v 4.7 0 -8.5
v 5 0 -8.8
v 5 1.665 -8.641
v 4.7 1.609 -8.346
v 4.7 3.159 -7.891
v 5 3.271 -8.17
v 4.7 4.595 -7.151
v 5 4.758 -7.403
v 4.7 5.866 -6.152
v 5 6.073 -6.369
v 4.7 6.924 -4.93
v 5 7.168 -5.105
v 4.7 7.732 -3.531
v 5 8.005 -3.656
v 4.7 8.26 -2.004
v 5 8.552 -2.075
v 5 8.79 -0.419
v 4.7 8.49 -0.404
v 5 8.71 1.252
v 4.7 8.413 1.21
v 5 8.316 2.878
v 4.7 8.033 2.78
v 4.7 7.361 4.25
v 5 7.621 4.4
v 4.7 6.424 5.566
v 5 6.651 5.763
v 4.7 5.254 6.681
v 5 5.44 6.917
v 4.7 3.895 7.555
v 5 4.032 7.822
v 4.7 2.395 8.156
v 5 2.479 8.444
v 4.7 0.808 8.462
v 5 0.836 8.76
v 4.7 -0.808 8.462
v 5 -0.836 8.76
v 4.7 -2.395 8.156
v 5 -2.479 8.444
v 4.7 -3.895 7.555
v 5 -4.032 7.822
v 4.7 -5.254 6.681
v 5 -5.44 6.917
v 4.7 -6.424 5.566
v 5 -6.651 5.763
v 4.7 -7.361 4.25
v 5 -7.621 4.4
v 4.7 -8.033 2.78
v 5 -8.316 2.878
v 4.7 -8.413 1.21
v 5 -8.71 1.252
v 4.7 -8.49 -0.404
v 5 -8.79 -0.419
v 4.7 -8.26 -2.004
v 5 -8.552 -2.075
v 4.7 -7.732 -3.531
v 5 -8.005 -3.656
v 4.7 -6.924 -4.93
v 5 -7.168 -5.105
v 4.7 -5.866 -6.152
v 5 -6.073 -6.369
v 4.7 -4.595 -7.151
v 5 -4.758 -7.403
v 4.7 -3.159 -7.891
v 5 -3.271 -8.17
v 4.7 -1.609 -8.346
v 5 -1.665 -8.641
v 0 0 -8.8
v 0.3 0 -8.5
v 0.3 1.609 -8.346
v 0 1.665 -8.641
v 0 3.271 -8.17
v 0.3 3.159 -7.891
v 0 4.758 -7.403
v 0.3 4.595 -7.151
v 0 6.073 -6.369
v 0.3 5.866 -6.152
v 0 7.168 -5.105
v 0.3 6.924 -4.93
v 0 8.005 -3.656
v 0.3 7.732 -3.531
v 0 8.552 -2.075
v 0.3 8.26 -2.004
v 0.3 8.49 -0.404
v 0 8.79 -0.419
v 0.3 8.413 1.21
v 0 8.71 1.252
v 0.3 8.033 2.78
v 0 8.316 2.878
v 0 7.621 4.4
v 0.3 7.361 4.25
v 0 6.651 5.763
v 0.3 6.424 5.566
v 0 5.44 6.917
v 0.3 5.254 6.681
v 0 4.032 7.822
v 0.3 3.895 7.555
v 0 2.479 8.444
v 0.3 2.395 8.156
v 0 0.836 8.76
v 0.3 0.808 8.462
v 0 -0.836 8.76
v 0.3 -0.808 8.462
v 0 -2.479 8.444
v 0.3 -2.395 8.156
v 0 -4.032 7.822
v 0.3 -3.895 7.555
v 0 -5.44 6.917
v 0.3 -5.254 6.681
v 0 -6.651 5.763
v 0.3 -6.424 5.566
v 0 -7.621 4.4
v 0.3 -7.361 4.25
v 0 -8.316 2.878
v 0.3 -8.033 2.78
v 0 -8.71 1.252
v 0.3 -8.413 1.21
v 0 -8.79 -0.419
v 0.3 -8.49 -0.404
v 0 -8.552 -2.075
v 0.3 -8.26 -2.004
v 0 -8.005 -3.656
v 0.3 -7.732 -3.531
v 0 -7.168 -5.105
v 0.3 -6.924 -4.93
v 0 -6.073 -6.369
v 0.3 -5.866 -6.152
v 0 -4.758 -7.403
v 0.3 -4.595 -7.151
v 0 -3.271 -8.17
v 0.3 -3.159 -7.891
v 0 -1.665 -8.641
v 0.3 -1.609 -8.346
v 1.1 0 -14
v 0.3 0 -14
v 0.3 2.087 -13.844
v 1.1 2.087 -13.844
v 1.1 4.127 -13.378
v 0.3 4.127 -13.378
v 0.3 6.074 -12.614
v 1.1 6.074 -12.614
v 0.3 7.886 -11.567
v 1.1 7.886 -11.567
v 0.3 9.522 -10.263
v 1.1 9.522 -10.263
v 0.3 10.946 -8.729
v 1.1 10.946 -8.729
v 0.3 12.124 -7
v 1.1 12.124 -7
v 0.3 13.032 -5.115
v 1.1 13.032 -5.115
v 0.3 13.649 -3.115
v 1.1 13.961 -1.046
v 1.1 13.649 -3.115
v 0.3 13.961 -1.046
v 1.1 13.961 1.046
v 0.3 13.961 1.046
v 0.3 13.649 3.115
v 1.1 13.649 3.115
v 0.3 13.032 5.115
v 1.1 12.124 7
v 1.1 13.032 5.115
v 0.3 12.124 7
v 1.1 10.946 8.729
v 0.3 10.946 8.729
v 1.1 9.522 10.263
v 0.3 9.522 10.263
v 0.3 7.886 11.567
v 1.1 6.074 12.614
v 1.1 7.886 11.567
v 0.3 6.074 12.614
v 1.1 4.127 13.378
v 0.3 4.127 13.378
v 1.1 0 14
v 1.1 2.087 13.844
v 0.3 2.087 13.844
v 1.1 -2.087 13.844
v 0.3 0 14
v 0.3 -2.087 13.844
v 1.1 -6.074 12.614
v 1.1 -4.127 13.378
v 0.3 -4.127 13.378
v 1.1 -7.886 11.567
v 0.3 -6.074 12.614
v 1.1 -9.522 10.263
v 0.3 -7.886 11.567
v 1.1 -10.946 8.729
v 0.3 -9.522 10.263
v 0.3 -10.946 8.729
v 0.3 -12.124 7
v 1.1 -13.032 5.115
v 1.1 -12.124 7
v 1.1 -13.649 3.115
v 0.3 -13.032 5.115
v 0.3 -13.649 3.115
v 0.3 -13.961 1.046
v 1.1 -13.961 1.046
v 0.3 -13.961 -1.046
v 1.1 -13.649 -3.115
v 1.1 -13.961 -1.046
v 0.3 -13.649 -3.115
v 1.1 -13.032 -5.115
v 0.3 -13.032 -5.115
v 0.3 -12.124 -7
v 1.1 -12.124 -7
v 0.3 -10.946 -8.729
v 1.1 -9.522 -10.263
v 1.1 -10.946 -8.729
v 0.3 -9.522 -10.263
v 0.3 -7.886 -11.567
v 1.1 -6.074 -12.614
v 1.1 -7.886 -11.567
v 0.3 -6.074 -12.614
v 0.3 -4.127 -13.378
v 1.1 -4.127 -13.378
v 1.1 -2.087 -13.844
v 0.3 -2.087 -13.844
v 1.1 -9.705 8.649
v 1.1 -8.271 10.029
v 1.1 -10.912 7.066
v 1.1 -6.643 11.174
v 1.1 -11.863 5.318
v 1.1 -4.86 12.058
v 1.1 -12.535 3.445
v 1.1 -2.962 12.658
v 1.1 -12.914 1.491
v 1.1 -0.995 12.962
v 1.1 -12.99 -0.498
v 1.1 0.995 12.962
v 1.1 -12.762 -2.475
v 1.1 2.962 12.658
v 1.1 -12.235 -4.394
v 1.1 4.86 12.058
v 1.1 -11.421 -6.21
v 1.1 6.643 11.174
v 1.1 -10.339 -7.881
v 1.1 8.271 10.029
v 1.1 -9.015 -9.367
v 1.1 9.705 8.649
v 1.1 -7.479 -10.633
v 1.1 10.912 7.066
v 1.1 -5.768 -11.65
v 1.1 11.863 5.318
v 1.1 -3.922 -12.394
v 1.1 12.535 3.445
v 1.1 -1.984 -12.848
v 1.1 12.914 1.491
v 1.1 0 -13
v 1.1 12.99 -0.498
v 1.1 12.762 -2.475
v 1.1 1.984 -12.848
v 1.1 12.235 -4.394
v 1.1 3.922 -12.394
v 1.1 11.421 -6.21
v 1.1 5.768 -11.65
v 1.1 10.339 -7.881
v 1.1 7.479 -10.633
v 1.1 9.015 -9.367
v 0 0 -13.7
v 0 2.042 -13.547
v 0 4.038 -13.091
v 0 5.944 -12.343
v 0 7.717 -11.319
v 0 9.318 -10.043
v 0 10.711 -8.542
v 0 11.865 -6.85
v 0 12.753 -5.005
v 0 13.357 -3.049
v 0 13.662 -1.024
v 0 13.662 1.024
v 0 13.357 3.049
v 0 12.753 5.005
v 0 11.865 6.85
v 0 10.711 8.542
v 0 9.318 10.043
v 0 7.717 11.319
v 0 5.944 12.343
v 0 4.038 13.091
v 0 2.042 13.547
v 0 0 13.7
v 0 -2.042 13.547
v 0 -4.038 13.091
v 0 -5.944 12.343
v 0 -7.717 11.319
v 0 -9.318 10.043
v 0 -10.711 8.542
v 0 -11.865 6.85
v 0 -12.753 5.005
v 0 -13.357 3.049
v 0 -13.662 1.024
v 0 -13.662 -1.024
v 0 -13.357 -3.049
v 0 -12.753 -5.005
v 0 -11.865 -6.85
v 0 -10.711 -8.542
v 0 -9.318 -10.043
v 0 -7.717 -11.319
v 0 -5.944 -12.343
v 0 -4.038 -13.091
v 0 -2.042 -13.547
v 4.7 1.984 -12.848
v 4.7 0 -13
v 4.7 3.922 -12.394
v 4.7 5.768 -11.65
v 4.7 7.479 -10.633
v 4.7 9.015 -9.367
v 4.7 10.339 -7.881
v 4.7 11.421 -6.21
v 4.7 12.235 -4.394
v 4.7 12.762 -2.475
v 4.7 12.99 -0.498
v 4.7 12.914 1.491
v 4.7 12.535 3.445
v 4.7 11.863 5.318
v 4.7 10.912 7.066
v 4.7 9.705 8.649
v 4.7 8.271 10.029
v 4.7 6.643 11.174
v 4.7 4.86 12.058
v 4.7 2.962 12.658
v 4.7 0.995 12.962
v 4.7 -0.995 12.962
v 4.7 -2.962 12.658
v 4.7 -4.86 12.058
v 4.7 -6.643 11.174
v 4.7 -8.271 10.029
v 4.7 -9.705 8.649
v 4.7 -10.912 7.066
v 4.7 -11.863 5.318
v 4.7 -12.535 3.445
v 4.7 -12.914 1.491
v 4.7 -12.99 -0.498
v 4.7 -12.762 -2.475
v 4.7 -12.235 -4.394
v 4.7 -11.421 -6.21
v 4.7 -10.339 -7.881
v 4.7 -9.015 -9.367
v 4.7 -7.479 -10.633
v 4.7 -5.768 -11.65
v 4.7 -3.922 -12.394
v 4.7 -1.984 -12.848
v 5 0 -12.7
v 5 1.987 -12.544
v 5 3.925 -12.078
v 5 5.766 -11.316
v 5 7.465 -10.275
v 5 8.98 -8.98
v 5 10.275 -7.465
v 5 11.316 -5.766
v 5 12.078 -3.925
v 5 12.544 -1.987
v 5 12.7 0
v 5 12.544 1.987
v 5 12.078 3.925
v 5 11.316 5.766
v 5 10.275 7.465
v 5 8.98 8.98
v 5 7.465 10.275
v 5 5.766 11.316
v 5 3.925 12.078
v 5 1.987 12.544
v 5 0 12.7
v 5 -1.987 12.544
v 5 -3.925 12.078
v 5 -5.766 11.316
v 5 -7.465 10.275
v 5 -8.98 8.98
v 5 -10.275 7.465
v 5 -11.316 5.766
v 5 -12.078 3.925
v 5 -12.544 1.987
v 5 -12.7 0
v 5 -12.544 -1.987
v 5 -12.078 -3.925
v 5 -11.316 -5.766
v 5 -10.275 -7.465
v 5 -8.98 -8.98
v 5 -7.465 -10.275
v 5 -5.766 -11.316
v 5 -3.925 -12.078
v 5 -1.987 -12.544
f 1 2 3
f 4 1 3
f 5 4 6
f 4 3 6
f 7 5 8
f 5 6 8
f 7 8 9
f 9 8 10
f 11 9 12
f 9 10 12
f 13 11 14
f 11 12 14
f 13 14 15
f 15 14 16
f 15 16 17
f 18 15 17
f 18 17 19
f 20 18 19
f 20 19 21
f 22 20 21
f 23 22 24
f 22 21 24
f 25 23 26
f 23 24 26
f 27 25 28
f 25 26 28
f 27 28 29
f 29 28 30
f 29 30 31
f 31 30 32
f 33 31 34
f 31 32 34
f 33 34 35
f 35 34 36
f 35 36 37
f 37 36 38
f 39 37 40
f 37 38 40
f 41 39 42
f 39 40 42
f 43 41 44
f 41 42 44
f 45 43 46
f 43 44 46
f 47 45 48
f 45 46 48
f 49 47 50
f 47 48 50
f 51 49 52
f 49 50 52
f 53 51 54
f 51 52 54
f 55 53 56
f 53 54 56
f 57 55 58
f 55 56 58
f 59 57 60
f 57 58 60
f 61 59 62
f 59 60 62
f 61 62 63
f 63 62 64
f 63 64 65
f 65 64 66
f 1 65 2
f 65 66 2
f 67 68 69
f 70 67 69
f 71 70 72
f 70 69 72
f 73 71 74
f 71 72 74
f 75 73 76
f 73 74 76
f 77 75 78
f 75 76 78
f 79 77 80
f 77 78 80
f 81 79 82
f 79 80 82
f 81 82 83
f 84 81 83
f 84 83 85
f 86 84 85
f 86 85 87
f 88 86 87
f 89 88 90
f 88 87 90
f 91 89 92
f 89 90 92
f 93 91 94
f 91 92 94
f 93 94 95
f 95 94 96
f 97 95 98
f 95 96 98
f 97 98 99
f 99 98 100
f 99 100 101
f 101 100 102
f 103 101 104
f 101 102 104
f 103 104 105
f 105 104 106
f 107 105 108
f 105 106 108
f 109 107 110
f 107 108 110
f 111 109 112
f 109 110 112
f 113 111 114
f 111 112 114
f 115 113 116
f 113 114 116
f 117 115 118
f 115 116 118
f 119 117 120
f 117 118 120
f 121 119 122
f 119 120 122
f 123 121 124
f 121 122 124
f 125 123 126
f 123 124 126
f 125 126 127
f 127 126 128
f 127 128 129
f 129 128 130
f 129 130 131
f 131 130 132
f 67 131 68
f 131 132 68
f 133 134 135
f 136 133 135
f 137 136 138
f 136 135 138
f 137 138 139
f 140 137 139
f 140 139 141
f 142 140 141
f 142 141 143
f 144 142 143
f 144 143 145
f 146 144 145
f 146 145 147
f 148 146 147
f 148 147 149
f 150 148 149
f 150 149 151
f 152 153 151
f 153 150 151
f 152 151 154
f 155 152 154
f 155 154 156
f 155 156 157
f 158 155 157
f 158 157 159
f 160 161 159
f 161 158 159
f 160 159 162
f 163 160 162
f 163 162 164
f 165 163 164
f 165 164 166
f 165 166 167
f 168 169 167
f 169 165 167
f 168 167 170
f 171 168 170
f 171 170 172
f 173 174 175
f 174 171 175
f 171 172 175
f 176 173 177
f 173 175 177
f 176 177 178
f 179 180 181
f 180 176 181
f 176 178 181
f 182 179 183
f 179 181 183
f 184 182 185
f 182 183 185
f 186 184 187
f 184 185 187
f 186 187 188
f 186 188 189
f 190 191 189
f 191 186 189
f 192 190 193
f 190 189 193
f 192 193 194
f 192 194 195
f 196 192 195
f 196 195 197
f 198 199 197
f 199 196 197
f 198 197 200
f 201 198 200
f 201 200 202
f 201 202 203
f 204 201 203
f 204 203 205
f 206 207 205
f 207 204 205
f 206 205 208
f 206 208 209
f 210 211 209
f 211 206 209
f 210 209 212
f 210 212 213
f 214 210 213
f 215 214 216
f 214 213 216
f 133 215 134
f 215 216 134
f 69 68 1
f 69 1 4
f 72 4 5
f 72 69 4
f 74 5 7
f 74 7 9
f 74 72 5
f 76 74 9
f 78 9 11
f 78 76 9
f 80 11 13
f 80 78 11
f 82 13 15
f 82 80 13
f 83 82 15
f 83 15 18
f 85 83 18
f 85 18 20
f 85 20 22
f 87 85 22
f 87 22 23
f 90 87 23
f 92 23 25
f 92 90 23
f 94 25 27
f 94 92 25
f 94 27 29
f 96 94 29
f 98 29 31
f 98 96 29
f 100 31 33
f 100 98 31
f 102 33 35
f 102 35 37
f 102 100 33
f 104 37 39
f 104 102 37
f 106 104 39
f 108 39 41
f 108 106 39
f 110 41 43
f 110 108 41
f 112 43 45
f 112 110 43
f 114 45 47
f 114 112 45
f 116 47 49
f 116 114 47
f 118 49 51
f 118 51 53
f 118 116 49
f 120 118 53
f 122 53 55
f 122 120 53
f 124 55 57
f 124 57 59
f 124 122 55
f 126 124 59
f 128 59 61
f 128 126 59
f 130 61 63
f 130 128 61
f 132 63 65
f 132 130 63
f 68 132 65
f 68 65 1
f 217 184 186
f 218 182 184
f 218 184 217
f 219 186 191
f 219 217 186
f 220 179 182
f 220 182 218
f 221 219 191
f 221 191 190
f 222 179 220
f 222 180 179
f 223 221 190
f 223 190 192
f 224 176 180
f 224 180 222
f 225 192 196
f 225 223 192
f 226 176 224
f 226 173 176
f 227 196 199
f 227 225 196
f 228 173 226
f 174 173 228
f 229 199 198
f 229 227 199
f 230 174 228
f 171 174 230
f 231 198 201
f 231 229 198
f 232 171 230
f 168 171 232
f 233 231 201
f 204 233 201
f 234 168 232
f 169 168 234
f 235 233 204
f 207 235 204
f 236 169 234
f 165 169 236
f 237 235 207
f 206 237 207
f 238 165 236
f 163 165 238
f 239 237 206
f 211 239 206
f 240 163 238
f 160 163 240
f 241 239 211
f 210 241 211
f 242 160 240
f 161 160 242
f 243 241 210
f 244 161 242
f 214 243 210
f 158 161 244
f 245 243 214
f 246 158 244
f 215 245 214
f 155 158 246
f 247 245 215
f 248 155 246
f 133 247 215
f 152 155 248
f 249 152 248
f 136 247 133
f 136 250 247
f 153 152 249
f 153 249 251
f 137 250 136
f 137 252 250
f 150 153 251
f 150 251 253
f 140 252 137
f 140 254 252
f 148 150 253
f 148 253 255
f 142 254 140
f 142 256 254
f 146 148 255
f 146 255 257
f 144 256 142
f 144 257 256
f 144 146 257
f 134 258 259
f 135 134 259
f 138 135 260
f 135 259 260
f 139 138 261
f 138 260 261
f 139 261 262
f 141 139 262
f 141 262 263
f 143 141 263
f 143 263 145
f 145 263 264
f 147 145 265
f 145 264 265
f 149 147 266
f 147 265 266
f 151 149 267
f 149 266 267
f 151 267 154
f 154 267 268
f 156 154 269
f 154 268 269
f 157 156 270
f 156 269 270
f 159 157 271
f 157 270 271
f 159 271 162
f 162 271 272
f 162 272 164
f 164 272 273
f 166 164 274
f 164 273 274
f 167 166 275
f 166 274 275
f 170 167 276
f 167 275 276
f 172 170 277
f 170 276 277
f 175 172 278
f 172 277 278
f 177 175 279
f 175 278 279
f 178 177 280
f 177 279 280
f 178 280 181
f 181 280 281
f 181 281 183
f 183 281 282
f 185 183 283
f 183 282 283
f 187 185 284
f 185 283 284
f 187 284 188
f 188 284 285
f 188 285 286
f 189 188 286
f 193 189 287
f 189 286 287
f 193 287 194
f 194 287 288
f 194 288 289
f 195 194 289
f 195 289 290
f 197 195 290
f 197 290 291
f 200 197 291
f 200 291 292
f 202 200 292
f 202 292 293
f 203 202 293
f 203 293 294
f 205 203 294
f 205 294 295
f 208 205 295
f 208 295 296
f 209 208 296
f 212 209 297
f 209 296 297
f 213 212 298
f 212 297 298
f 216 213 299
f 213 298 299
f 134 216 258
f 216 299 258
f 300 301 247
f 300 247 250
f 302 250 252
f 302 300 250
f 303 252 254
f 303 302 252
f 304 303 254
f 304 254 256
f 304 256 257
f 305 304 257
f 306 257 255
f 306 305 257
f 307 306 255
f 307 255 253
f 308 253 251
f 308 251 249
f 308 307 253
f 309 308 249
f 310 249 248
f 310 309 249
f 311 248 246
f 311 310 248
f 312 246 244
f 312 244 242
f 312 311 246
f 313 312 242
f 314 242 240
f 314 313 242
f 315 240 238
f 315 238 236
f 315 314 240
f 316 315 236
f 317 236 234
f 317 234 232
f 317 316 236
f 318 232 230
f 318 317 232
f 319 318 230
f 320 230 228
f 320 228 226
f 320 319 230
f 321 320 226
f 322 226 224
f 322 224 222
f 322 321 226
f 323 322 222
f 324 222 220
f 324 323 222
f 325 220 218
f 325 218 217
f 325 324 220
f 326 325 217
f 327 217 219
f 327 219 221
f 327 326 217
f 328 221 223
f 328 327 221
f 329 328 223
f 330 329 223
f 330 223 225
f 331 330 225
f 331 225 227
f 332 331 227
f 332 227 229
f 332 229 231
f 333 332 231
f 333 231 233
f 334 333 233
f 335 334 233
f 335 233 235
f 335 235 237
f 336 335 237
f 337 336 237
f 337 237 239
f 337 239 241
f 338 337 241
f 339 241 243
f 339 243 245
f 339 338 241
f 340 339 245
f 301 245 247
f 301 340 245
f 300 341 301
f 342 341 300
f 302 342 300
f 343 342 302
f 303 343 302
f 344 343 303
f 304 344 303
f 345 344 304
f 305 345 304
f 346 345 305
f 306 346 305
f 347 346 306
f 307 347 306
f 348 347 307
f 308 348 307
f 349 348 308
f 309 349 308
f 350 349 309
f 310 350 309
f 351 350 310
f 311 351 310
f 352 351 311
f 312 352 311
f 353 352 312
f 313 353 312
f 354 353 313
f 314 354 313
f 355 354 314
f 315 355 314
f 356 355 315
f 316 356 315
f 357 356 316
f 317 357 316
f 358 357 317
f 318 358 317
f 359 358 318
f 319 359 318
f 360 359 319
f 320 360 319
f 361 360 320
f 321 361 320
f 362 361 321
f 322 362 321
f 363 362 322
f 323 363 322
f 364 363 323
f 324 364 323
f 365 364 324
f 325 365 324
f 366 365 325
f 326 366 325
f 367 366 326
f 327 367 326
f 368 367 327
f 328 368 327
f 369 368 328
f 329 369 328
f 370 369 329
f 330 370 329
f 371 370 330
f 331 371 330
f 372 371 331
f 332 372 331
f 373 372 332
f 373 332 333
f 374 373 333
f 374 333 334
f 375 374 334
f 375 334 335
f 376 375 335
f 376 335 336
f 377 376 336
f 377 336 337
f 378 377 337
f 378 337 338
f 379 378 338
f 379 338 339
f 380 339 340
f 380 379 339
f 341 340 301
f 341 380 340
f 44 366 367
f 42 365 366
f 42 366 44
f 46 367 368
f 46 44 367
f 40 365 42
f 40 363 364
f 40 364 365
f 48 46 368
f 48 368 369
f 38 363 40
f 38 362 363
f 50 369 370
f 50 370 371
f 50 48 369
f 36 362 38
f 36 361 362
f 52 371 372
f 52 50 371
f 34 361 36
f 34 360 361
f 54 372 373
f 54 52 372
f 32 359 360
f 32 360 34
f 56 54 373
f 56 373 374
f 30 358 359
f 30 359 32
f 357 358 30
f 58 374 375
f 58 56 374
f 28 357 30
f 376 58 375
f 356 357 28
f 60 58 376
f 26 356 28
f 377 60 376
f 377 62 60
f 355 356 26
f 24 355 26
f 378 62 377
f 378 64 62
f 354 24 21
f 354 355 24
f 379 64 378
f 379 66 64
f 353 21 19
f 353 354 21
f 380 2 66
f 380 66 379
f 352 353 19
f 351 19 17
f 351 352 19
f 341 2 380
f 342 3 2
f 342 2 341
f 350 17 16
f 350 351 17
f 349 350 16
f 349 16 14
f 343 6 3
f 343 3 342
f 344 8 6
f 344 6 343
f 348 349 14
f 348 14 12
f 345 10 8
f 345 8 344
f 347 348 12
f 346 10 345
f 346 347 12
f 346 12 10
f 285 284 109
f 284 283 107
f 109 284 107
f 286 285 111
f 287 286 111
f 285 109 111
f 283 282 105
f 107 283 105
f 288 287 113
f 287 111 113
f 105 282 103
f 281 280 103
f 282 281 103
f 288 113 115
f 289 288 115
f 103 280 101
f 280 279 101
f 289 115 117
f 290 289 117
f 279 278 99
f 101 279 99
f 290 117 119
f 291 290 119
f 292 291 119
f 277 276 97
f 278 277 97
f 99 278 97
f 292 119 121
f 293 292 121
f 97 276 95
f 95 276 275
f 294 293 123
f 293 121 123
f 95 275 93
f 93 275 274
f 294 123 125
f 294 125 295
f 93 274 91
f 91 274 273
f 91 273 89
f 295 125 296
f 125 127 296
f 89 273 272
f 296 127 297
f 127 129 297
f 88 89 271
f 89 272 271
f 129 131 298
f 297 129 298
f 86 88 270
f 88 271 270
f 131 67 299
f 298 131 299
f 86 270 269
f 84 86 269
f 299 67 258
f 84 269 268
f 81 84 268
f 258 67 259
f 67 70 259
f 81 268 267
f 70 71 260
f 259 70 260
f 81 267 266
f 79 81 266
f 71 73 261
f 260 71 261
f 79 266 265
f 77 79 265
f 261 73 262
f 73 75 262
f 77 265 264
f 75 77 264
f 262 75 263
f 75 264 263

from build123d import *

# Parameters (mm, degrees)
SKETCH_1_R          = 14
SKETCH_1_R_2        = 8.5
EXTRUDE_1_DEPTH     = 5
SKETCH_2_R          = 16.127190563
SKETCH_2_R_2        = 13
CUT_EXTRUDE_1_DEPTH = 3.9
CHAMFER_1_SIZE      = 0.3


with BuildPart() as part:
    # 草图1 → 凸台-拉伸1 (new body)
    with BuildSketch(Plane(origin=(0, 0, 0), x_dir=(0, 0, -1), z_dir=(1, 0, 0))):
        Circle(SKETCH_1_R)
        Circle(SKETCH_1_R_2, mode=Mode.SUBTRACT)
    extrude(amount=EXTRUDE_1_DEPTH)

    # 草图2 → 切除-拉伸1 (cut)
    with BuildSketch(Plane(origin=(5, 0, 0), x_dir=(0, 0, -1), z_dir=(1, 0, 0))):
        Circle(SKETCH_2_R)
        Circle(SKETCH_2_R_2, mode=Mode.SUBTRACT)
    extrude(amount=-CUT_EXTRUDE_1_DEPTH, mode=Mode.SUBTRACT)

    # 倒角1
    chamfer_1_edges = [part.edges().sort_by_distance(p)[0] for p in [
        (5, 0, 13),
        (0, 0, 14),
        (0, 0, 8.5),
        (5, 0, 8.5),
    ]]
    chamfer(chamfer_1_edges, length=CHAMFER_1_SIZE)


solid = part.part
